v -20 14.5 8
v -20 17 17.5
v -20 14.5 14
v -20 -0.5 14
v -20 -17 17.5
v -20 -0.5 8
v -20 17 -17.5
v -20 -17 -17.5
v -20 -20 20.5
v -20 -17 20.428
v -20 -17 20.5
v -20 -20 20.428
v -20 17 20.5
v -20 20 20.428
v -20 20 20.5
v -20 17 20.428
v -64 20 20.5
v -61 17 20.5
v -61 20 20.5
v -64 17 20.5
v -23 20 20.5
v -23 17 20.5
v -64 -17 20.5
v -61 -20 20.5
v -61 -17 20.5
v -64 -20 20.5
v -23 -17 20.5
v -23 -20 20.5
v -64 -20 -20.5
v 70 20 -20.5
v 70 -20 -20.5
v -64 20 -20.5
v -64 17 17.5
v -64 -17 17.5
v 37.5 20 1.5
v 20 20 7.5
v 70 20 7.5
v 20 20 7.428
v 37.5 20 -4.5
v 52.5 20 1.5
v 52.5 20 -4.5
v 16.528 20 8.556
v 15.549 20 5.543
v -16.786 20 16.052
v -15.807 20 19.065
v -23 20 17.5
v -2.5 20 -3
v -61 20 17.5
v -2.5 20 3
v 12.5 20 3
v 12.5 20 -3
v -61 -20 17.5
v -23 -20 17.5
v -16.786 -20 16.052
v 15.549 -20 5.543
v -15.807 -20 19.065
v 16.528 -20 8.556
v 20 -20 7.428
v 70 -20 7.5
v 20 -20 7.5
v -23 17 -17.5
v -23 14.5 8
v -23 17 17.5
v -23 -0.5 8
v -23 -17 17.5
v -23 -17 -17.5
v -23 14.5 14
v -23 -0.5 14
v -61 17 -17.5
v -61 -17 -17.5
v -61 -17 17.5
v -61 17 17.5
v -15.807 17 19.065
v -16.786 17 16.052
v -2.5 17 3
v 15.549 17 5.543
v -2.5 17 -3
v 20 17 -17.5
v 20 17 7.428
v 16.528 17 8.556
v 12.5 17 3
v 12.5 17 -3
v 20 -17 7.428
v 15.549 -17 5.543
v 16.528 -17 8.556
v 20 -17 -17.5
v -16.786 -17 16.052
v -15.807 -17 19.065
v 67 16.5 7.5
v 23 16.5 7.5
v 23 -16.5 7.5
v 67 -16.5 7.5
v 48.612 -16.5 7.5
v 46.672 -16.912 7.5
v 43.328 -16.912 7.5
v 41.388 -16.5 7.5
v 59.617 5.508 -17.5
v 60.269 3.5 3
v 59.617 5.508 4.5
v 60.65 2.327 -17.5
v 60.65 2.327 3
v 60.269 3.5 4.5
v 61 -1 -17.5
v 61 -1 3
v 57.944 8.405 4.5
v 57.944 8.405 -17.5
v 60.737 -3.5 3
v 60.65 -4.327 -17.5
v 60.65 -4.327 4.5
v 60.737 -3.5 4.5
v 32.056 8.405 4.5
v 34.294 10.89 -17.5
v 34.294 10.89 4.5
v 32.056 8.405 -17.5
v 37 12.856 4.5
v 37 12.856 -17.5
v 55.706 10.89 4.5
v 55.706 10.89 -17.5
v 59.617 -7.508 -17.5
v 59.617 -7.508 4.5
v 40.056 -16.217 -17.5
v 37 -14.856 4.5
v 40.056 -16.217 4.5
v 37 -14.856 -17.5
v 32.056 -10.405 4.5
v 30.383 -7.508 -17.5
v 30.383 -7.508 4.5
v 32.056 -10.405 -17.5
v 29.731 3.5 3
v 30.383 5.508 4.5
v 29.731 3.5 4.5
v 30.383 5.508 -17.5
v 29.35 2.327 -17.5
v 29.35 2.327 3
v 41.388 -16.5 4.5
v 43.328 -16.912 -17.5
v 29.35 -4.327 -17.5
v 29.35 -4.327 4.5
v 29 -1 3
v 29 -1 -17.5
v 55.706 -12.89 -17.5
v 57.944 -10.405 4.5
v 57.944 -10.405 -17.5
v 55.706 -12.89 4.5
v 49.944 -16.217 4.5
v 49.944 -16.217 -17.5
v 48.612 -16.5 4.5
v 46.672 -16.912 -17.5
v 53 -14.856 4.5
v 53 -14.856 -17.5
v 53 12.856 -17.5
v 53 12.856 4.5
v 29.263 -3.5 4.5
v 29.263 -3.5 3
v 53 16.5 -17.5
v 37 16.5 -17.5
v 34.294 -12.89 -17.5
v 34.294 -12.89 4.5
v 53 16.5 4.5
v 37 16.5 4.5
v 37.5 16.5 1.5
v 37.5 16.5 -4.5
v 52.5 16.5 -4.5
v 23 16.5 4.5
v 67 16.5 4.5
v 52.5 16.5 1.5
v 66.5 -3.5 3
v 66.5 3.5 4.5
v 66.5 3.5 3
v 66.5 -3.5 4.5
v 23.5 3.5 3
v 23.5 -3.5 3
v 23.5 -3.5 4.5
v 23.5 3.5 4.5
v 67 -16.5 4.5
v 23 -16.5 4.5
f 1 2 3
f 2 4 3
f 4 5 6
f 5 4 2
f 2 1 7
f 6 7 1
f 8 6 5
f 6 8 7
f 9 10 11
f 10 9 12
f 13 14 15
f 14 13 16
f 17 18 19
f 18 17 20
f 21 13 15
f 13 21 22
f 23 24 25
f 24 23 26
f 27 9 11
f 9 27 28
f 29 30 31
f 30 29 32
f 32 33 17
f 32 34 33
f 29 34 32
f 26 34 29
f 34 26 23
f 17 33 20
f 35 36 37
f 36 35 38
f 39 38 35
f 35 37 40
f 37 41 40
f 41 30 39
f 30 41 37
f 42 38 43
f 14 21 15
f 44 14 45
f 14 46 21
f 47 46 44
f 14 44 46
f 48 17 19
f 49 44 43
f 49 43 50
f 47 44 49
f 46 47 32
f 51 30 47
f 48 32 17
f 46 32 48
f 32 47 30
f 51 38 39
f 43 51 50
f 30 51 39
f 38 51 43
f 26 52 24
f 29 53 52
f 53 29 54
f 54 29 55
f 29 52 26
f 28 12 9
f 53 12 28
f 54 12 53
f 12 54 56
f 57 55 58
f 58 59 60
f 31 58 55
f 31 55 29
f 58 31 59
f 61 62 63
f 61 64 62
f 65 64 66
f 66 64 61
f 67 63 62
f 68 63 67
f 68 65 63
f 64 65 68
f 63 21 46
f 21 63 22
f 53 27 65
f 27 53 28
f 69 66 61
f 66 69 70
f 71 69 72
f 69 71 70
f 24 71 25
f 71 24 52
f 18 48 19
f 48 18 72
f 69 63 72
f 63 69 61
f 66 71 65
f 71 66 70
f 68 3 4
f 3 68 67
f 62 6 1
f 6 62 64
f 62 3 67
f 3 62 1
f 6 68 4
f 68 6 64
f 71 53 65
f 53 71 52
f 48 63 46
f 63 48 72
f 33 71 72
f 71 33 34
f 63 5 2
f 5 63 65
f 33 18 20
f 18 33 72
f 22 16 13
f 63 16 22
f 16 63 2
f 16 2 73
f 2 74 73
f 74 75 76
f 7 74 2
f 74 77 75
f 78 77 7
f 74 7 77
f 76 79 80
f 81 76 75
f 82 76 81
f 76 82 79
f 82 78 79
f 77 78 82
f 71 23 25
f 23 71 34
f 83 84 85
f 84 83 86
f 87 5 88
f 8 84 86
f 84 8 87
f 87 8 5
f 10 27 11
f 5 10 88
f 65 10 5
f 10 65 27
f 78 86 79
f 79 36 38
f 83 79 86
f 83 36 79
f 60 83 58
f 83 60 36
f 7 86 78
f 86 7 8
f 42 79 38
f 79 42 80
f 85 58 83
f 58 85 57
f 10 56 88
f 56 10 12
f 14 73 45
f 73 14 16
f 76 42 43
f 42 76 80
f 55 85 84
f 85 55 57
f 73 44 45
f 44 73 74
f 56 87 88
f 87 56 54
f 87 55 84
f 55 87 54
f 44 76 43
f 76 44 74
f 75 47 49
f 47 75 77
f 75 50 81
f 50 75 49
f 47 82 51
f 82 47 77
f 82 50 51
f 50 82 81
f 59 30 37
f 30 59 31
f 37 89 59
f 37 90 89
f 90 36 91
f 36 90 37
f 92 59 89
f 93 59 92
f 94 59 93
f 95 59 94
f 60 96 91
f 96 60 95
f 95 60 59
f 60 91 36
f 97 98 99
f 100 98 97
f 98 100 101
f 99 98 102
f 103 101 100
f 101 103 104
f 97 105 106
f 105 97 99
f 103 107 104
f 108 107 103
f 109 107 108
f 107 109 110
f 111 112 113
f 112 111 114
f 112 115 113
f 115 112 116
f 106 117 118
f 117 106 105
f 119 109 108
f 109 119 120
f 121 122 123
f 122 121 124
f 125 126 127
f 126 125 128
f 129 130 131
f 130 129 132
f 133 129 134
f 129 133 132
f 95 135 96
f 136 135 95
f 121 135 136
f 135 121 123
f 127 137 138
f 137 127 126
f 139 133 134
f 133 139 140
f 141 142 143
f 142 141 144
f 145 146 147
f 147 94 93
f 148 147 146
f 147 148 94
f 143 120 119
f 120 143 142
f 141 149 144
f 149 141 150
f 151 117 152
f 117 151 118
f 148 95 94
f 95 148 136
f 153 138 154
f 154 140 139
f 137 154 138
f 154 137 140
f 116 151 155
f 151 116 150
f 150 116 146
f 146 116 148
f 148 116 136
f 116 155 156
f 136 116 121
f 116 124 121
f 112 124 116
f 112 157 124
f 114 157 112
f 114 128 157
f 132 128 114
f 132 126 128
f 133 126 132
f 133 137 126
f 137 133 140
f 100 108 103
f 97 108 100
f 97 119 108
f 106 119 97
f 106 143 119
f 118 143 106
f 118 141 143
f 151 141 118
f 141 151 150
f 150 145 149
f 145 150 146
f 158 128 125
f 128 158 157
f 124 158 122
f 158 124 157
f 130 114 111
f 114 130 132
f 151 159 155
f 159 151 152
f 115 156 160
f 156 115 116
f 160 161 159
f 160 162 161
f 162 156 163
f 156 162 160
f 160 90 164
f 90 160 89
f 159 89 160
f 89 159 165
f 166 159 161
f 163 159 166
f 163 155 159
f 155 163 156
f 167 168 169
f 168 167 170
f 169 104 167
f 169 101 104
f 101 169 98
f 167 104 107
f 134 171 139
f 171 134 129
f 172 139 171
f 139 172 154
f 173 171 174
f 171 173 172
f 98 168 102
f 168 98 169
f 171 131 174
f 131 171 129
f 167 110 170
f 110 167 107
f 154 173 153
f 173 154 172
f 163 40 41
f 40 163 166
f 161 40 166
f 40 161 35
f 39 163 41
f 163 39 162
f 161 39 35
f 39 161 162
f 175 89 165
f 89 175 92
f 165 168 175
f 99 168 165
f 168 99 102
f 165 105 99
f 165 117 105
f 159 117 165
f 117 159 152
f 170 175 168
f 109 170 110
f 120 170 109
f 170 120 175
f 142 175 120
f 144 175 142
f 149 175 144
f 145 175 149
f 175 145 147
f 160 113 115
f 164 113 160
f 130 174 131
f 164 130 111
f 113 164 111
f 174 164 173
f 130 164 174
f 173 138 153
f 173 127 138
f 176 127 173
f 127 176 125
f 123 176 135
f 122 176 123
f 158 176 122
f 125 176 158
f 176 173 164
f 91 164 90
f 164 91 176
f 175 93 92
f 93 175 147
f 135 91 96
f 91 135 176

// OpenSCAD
module bujin(){
    difference(){
        cube([50,40,28],center=true);
        translate([0,-1,3])
        cylinder(r=16,h=28,center=true);
        translate([0,15+2-4/2-1,3])
        cube([16,5,28],center=true);
        translate([0,0,15-5/2])
        cube([43,7,6],center=true);
        translate([0,20,14-6-3])
        cube([15,10,6],center=true);
        translate([0,0,15-4/2])
        cube([44,33,4],center=true);    
    }    
}
module unl(){
    difference(){
        cube([44,40,41],center=true);
        translate([0,0,3])
        cube([38,34,41],center=true);
        translate([21,7,11])
        cube([10,15,6],center=true);
        translate([0,0,20.5+1-4/2])
        cube([38,100,4],center=true);
        translate([0,0,20.5+1-4/2])
        cube([100,34,4],center=true);    
    }    
}
module lianjie(){
    difference(){
        cube([40,40,41],center=true);
        translate([0,0,3])
        cube([100,34,41],center=true);
        translate([0,0,14.7+30/2])
        rotate([0,-atan(13/40),0])
        cube([100,42,30],center=true);
        translate([0,0,14.7+4/2-4])
        rotate([0,-atan(13/40),0])
        cube([34,42,4],center=true);
        translate([-5,-15,0])
        cube([15,12,6],center=true);
    }    
}
translate([-44/2-40/2,0,0])
unl();
rotate([0,0,180])
lianjie();
translate([50/2+40/2,0,-41/2+28/2])
bujin();
